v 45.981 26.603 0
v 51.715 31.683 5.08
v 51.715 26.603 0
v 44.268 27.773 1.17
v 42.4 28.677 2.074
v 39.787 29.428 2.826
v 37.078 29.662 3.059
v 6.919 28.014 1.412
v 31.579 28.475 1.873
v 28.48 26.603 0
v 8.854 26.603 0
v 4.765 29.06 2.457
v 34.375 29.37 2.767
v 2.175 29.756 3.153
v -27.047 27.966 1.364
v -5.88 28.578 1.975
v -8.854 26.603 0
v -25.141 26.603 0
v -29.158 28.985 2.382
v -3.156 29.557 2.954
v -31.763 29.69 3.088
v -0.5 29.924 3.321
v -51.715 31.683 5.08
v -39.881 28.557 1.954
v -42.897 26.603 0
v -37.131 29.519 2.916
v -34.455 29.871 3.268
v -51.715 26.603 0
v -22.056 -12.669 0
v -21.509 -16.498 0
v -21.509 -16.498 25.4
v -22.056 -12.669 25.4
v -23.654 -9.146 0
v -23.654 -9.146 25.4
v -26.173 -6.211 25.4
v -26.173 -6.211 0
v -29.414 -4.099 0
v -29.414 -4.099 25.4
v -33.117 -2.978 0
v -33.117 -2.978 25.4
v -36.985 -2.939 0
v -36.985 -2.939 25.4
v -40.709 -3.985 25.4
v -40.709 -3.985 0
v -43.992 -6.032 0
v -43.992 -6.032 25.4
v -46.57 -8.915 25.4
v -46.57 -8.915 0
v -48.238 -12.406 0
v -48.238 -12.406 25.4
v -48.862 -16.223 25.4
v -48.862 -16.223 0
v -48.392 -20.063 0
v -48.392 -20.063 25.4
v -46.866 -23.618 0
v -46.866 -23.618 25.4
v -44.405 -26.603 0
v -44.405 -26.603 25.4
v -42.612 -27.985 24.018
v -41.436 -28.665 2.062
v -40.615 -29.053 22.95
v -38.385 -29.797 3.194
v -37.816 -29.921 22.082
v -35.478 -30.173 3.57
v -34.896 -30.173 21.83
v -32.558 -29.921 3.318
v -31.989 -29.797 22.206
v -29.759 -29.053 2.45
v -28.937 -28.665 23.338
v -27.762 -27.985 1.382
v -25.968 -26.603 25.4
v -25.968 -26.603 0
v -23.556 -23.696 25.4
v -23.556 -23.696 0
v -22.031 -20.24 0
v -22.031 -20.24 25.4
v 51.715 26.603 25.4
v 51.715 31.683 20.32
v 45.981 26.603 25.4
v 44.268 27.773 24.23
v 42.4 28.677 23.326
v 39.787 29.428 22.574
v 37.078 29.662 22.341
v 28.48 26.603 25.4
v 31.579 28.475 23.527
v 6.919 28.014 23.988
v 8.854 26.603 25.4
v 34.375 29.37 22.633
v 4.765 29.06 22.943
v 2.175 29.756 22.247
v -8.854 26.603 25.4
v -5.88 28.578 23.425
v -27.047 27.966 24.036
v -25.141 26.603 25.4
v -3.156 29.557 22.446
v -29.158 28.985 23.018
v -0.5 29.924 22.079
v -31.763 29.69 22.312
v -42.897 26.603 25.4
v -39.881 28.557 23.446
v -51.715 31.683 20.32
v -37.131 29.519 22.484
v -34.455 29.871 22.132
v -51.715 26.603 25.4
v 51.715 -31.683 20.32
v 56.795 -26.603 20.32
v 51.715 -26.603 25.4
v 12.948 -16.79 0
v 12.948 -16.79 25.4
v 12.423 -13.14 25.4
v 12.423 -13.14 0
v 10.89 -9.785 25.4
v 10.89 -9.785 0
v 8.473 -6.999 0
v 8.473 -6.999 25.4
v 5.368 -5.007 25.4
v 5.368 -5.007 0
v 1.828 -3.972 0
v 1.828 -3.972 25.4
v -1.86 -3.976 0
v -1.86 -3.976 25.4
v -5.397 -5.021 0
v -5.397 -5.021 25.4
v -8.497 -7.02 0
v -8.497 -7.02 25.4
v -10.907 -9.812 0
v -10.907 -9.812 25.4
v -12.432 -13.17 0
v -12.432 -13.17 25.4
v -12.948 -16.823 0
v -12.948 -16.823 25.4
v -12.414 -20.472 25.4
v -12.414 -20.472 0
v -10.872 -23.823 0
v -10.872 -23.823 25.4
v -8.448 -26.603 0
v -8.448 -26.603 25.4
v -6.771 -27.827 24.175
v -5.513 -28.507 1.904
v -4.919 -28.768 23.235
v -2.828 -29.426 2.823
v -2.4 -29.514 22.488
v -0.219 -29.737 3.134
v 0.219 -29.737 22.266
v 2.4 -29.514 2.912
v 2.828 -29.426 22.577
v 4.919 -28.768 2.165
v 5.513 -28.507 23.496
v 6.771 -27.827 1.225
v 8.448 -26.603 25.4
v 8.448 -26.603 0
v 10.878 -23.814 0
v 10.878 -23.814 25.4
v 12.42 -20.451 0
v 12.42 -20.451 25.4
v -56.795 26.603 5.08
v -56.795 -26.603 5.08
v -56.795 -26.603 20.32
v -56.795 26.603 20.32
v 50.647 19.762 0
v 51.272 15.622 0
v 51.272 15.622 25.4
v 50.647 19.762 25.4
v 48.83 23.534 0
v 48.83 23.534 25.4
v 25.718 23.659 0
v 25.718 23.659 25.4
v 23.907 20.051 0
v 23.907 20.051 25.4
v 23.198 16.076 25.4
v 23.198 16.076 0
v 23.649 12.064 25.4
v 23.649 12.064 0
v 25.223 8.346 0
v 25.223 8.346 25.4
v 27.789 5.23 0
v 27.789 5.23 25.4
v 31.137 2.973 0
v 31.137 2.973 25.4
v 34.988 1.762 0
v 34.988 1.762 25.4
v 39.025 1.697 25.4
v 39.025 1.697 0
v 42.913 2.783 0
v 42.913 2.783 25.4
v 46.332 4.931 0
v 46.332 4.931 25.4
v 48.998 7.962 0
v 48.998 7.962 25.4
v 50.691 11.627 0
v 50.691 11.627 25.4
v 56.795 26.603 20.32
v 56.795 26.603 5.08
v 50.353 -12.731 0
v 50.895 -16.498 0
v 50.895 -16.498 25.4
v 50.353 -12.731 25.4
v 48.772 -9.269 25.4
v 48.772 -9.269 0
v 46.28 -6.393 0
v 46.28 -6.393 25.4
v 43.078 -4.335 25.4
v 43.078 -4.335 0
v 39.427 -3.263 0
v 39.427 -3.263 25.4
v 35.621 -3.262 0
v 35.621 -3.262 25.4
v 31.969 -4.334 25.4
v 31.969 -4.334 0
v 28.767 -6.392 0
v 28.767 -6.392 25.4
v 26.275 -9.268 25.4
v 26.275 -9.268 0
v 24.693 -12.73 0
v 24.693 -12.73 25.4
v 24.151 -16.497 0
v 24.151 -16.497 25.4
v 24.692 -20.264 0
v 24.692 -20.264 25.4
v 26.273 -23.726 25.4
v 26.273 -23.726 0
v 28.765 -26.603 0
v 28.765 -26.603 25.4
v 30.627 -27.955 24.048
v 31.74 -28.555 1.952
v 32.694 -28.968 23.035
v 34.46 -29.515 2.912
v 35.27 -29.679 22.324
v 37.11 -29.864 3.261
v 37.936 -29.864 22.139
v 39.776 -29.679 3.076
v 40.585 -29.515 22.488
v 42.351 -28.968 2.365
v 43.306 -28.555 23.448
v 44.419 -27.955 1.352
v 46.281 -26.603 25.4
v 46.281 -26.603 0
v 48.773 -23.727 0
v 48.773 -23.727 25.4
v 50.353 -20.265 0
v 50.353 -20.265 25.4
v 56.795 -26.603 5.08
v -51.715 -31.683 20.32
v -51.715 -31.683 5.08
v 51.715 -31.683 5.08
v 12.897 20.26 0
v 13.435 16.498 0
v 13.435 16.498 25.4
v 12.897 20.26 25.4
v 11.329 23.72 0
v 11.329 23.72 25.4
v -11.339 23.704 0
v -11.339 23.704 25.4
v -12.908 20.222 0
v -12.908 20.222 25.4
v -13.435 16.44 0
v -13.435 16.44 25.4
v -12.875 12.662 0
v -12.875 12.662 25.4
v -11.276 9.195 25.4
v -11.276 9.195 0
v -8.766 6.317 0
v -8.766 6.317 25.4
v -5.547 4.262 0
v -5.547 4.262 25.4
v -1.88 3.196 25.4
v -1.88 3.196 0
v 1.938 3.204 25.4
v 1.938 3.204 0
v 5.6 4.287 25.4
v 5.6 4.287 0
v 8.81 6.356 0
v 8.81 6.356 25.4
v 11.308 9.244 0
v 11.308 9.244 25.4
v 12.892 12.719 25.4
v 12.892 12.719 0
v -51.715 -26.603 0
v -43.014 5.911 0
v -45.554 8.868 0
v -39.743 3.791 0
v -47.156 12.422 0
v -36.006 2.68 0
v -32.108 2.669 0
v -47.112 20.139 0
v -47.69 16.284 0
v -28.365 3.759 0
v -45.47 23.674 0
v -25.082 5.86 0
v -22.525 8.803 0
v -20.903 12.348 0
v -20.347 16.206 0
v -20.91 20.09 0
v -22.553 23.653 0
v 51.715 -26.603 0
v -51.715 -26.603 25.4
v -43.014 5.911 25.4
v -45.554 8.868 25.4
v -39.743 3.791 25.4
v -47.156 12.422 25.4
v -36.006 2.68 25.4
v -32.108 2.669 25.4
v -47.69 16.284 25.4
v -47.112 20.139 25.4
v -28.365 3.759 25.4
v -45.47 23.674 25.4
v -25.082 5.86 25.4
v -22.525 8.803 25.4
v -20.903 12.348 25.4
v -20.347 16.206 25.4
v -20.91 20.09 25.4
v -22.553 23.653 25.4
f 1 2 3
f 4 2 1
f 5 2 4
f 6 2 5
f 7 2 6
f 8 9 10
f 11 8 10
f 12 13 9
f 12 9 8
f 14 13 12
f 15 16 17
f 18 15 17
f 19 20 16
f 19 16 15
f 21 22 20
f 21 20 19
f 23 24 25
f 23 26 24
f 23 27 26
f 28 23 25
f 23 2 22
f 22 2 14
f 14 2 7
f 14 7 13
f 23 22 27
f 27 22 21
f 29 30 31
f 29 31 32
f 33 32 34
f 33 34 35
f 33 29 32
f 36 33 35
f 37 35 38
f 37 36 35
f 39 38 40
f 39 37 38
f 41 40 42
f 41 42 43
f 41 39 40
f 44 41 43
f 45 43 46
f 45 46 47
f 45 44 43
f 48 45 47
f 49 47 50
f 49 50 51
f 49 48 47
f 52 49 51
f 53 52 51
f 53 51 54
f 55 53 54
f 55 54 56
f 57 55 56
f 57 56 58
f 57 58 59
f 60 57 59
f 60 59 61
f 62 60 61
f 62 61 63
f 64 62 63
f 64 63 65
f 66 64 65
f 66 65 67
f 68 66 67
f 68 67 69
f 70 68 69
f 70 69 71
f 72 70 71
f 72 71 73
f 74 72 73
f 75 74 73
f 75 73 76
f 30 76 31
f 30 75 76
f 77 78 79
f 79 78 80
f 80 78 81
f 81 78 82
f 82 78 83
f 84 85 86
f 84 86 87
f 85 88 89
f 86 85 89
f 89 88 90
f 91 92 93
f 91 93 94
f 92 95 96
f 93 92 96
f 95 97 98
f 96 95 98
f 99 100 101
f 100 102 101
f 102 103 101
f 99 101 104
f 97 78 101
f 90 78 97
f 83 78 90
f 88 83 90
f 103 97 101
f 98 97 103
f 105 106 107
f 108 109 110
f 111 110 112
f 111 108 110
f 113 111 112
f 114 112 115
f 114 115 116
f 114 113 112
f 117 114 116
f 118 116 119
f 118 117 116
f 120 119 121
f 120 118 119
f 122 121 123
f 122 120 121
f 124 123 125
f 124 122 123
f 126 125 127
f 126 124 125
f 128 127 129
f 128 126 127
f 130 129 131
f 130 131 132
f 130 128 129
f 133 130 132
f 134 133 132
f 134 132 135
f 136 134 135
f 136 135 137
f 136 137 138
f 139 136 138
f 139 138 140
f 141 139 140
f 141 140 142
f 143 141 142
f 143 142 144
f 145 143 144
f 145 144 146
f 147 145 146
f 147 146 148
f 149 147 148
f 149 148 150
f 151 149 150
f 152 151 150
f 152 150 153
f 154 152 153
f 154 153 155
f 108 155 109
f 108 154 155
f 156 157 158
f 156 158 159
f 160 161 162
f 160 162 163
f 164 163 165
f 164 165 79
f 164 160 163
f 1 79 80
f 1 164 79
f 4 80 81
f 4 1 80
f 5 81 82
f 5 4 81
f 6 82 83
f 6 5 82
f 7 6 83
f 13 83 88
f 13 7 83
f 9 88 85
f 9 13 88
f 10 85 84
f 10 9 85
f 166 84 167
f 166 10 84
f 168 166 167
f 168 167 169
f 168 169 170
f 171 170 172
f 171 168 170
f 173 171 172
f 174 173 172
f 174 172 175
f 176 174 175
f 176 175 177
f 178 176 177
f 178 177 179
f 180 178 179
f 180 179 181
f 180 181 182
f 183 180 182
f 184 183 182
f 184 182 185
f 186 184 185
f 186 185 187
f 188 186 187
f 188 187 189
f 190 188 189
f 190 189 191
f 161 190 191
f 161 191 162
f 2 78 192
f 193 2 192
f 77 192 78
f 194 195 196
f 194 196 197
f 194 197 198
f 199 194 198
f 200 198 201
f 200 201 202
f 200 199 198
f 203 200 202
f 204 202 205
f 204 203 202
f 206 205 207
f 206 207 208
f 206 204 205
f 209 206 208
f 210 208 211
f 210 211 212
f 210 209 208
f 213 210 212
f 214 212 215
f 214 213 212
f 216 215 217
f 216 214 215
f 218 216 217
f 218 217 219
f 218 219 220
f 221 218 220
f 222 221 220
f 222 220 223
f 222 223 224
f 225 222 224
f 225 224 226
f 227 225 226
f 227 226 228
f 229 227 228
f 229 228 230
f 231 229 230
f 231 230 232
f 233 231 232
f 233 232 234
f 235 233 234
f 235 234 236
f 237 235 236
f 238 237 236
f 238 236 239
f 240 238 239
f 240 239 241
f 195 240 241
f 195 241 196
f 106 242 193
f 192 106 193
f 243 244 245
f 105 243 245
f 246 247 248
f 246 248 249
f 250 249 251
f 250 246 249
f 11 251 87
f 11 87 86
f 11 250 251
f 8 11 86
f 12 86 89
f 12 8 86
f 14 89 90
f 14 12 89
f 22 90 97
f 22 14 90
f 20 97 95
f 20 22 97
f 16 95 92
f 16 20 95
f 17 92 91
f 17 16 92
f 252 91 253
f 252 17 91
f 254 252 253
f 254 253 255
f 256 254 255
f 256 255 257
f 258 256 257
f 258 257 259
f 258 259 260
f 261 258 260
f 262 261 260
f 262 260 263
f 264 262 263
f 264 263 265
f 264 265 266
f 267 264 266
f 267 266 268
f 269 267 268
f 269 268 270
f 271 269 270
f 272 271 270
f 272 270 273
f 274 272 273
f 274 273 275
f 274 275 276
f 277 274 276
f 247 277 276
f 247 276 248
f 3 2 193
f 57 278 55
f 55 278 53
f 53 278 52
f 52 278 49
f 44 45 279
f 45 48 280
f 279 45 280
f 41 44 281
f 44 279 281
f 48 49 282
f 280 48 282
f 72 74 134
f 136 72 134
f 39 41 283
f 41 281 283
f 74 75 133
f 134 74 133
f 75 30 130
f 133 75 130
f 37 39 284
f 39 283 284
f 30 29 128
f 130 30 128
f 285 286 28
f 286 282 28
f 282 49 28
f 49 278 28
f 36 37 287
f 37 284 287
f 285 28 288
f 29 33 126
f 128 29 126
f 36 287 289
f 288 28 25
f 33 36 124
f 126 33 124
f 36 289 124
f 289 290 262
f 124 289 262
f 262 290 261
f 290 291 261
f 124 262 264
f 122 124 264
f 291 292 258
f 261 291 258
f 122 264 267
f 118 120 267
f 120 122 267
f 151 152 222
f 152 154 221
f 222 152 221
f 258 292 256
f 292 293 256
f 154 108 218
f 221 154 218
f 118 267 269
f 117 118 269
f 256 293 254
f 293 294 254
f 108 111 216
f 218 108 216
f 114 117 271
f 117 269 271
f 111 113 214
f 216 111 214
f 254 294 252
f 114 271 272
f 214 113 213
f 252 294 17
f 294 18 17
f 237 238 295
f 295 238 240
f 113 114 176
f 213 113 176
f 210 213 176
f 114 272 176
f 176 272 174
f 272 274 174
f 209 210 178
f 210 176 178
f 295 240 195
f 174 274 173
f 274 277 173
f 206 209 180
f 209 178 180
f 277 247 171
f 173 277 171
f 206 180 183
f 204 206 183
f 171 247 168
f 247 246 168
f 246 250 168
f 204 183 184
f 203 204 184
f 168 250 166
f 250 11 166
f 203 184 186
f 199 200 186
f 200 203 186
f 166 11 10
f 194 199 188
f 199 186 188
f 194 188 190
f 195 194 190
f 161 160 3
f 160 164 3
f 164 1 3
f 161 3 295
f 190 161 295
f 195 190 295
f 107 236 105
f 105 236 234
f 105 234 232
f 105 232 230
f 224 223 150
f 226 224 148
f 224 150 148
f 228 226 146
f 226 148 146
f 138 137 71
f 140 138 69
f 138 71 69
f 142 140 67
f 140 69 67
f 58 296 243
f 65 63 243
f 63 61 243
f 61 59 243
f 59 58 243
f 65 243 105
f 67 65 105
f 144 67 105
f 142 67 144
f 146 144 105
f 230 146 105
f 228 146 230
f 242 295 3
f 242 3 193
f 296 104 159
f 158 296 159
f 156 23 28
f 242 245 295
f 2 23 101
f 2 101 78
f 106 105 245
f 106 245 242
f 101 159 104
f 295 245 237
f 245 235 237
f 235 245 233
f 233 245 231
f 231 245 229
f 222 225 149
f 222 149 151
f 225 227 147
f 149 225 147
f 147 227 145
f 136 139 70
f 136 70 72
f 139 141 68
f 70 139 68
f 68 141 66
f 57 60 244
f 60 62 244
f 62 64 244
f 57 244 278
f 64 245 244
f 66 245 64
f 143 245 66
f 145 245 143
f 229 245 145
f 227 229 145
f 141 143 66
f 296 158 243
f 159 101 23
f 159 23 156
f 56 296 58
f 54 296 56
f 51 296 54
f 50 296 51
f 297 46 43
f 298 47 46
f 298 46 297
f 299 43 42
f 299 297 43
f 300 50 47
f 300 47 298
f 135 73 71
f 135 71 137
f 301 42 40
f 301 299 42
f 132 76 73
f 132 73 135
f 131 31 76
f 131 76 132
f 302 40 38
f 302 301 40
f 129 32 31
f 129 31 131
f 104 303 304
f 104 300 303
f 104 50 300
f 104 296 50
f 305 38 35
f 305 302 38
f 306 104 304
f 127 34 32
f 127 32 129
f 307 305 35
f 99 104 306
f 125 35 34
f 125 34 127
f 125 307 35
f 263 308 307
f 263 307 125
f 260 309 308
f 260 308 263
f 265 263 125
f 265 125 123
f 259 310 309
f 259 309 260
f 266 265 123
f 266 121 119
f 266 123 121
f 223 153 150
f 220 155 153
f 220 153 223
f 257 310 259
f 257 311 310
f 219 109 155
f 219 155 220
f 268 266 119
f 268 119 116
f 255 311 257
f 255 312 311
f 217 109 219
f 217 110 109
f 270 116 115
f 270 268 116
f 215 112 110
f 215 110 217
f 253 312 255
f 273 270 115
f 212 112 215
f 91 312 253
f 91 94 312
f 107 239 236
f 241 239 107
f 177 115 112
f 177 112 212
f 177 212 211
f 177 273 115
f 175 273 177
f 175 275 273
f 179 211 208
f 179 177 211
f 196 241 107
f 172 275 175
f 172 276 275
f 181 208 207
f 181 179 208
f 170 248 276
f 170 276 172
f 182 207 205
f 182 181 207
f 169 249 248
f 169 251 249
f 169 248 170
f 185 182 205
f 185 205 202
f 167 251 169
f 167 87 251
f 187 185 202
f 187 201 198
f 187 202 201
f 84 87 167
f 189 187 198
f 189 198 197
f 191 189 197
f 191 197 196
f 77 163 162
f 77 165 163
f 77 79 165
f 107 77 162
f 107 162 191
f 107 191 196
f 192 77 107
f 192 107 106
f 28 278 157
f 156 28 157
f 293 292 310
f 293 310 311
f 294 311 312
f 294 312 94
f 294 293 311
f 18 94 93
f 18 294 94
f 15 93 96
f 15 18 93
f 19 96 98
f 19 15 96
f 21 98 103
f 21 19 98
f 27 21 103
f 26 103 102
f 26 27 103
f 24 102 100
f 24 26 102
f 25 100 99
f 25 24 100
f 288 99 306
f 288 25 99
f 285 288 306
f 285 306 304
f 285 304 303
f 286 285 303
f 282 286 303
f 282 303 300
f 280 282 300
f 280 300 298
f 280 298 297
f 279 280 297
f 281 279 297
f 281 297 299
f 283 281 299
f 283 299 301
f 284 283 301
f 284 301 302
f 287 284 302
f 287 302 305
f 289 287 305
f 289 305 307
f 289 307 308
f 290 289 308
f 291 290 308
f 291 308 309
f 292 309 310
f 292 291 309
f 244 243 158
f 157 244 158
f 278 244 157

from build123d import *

# Parameters (mm, degrees)
F0_W         = 113.590836525
F0_H         = 63.365586102
F0_R         = 13.6776668511
F0_R_2       = 12.9483089266
F0_R_3       = 13.3718975465
F0_R_4       = 13.6714310258
F0_R_5       = 14.0406678545
F0_R_6       = 13.4346835475
F1_DEPTH     = 25.4
F2_W         = 109.635181725
F2_H         = 62.0416179299
F2_R         = 13.6776668511
F2_R_2       = 12.9483089266
F2_R_3       = 13.3718975465
F2_R_4       = 13.6714310258
F2_R_5       = 14.0406678545
F2_R_6       = 13.4346835475
F3_DEPTH     = 12.7
F4_T1_DEPTH  = 6.4524666085
F4_T3_DEPTH  = 6.4524666085
F4_T5_DEPTH  = 6.4524666085
F4_T7_DEPTH  = 6.4524666085
F4_T9_DEPTH  = 6.4524666085
F4_T11_DEPTH = 6.4524666085
F4_T13_DEPTH = 6.4524666085
F4_T15_DEPTH = 6.4524666085
F4_T17_DEPTH = 89.4938852597
F4_T19_DEPTH = 139.7191356827
F4_T21_DEPTH = 51.5282991577


# Not quite as in the source:
# - a fillet or chamfer that OpenCascade refuses, or shapes differently, is made with other operations: its cross-section is extruded or revolved along the edge and cut away or added


with BuildPart() as f1:
    # F0 (on Top) → F1 (new body)
    with BuildSketch(Plane.XY):
        Rectangle(F0_W, F0_H)
        with Locations((-35.1868793368, -16.4984129369)):
            Circle(F0_R, mode=Mode.SUBTRACT)
        with Locations((0, -16.790419817)):
            Circle(F0_R_2, mode=Mode.SUBTRACT)
        with Locations((37.5229418278, -16.4984129369)):
            Circle(F0_R_3, mode=Mode.SUBTRACT)
        with Locations((-34.0188518167, 16.2064060569)):
            Circle(F0_R_4, mode=Mode.SUBTRACT)
        with Locations((37.2309349477, 15.6223904341)):
            Circle(F0_R_5, mode=Mode.SUBTRACT)
        with Locations((0, 16.4984129369)):
            Circle(F0_R_6, mode=Mode.SUBTRACT)
    extrude(amount=F1_DEPTH)

    # F2 (on face) → F3 (join)
    with BuildSketch(Plane.XY):
        Rectangle(F2_W, F2_H)
        with Locations((-35.1868793368, -16.4984129369)):
            Circle(F2_R, mode=Mode.SUBTRACT)
        with Locations((0, -16.790419817)):
            Circle(F2_R_2, mode=Mode.SUBTRACT)
        with Locations((37.5229418278, -16.4984129369)):
            Circle(F2_R_3, mode=Mode.SUBTRACT)
        with Locations((-34.0188518167, 16.2064060569)):
            Circle(F2_R_4, mode=Mode.SUBTRACT)
        with Locations((37.2309349477, 15.6223904341)):
            Circle(F2_R_5, mode=Mode.SUBTRACT)
        with Locations((0, 16.4984129369)):
            Circle(F2_R_6, mode=Mode.SUBTRACT)
    extrude(amount=F3_DEPTH)

    # F4: chamfer of 5.08 on 12 edges, made by hand

    # F4_s2 → F4_t1 (cut)
    with BuildSketch(Plane(origin=(26.1060704378, -26.1060704378, -26.1060704378), x_dir=(0.7071067812, 0.7071067812, 0), z_dir=(0.5773502692, -0.5773502692, -0.5773502692))):
        Polygon((14.165205132, 38.1949798276), (17.7573075804, 31.9732758809), (21.3494100289, 38.1949798276), align=None)
    extrude(amount=F4_T1_DEPTH, mode=Mode.SUBTRACT)

    # F4_s4 → F4_t3 (cut)
    with BuildSketch(Plane(origin=(26.1060704378, 26.1060704378, -26.1060704378), x_dir=(-0.7071067812, 0.7071067812, 0), z_dir=(0.5773502692, 0.5773502692, -0.5773502692))):
        Polygon((-14.165205132, 38.1949798276), (-17.7573075804, 31.9732758809), (-21.3494100289, 38.1949798276), align=None)
    extrude(amount=F4_T3_DEPTH, mode=Mode.SUBTRACT)

    # F4_s6 → F4_t5 (cut)
    with BuildSketch(Plane(origin=(-26.1060704378, 26.1060704378, -26.1060704378), x_dir=(-0.7071067812, -0.7071067812, 0), z_dir=(-0.5773502692, 0.5773502692, -0.5773502692))):
        Polygon((14.165205132, 38.1949798276), (17.7573075804, 31.9732758809), (21.3494100289, 38.1949798276), align=None)
    extrude(amount=F4_T5_DEPTH, mode=Mode.SUBTRACT)

    # F4_s8 → F4_t7 (cut)
    with BuildSketch(Plane(origin=(-26.1060704378, -26.1060704378, -26.1060704378), x_dir=(0.7071067812, -0.7071067812, 0), z_dir=(-0.5773502692, -0.5773502692, -0.5773502692))):
        Polygon((-14.165205132, 38.1949798276), (-17.7573075804, 31.9732758809), (-21.3494100289, 38.1949798276), align=None)
    extrude(amount=F4_T7_DEPTH, mode=Mode.SUBTRACT)

    # F4_s10 → F4_t9 (cut)
    with BuildSketch(Plane(origin=(-34.5727371045, 34.5727371045, 34.5727371045), x_dir=(-0.7071067812, -0.7071067812, 0), z_dir=(-0.5773502692, 0.5773502692, 0.5773502692))):
        Polygon((14.165205132, -17.455966672), (17.7573075804, -11.2342627254), (21.3494100289, -17.455966672), align=None)
    extrude(amount=F4_T9_DEPTH, mode=Mode.SUBTRACT)

    # F4_s12 → F4_t11 (cut)
    with BuildSketch(Plane(origin=(34.5727371045, -34.5727371045, 34.5727371045), x_dir=(0.7071067812, 0.7071067812, 0), z_dir=(0.5773502692, -0.5773502692, 0.5773502692))):
        Polygon((14.165205132, -17.455966672), (17.7573075804, -11.2342627254), (21.3494100289, -17.455966672), align=None)
    extrude(amount=F4_T11_DEPTH, mode=Mode.SUBTRACT)

    # F4_s14 → F4_t13 (cut)
    with BuildSketch(Plane(origin=(34.5727371045, 34.5727371045, 34.5727371045), x_dir=(-0.7071067812, 0.7071067812, 0), z_dir=(0.5773502692, 0.5773502692, 0.5773502692))):
        Polygon((-14.165205132, -17.455966672), (-17.7573075804, -11.2342627254), (-21.3494100289, -17.455966672), align=None)
    extrude(amount=F4_T13_DEPTH, mode=Mode.SUBTRACT)

    # F4_s16 → F4_t15 (cut)
    with BuildSketch(Plane(origin=(-34.5727371045, -34.5727371045, 34.5727371045), x_dir=(0.7071067812, -0.7071067812, 0), z_dir=(-0.5773502692, -0.5773502692, 0.5773502692))):
        Polygon((-14.165205132, -17.455966672), (-17.7573075804, -11.2342627254), (-21.3494100289, -17.455966672), align=None)
    extrude(amount=F4_T15_DEPTH, mode=Mode.SUBTRACT)

    # F4_s18 → F4_t17 (cut)
    with BuildSketch(Plane.XZ.offset(-44.7469426299)):
        Polygon((51.7154182625, 0), (56.7954182625, 5.08), (56.7954182625, 0), align=None)
        Polygon((-51.7154182625, 0), (-56.7954182625, 5.08), (-56.7954182625, 0), align=None)
        Polygon((-51.7154182625, 25.4), (-56.7954182625, 20.32), (-56.7954182625, 25.4), align=None)
        Polygon((51.7154182625, 25.4), (56.7954182625, 20.32), (56.7954182625, 25.4), align=None)
    extrude(amount=F4_T17_DEPTH, mode=Mode.SUBTRACT)

    # F4_s20 → F4_t19 (cut)
    with BuildSketch(Plane.YZ.offset(-69.8595678413)):
        Polygon((31.682793051, 5.08), (26.602793051, 0), (31.682793051, 0), align=None)
        Polygon((-31.682793051, 5.08), (-26.602793051, 0), (-31.682793051, 0), align=None)
        Polygon((31.682793051, 20.32), (26.602793051, 25.4), (31.682793051, 25.4), align=None)
        Polygon((-26.602793051, 25.4), (-31.682793051, 20.32), (-31.682793051, 25.4), align=None)
    extrude(amount=F4_T19_DEPTH, mode=Mode.SUBTRACT)

    # F4_s22 → F4_t21 (cut)
    with BuildSketch(Plane.XY.offset(-13.0641495789)):
        Polygon((-51.7154182625, 31.682793051), (-56.7954182625, 26.602793051), (-56.7954182625, 31.682793051), align=None)
        Polygon((51.7154182625, -31.682793051), (56.7954182625, -26.602793051), (56.7954182625, -31.682793051), align=None)
        Polygon((-51.7154182625, -31.682793051), (-56.7954182625, -26.602793051), (-56.7954182625, -31.682793051), align=None)
        Polygon((51.7154182625, 31.682793051), (56.7954182625, 26.602793051), (56.7954182625, 31.682793051), align=None)
    extrude(amount=F4_T21_DEPTH, mode=Mode.SUBTRACT)


solid = f1.part
